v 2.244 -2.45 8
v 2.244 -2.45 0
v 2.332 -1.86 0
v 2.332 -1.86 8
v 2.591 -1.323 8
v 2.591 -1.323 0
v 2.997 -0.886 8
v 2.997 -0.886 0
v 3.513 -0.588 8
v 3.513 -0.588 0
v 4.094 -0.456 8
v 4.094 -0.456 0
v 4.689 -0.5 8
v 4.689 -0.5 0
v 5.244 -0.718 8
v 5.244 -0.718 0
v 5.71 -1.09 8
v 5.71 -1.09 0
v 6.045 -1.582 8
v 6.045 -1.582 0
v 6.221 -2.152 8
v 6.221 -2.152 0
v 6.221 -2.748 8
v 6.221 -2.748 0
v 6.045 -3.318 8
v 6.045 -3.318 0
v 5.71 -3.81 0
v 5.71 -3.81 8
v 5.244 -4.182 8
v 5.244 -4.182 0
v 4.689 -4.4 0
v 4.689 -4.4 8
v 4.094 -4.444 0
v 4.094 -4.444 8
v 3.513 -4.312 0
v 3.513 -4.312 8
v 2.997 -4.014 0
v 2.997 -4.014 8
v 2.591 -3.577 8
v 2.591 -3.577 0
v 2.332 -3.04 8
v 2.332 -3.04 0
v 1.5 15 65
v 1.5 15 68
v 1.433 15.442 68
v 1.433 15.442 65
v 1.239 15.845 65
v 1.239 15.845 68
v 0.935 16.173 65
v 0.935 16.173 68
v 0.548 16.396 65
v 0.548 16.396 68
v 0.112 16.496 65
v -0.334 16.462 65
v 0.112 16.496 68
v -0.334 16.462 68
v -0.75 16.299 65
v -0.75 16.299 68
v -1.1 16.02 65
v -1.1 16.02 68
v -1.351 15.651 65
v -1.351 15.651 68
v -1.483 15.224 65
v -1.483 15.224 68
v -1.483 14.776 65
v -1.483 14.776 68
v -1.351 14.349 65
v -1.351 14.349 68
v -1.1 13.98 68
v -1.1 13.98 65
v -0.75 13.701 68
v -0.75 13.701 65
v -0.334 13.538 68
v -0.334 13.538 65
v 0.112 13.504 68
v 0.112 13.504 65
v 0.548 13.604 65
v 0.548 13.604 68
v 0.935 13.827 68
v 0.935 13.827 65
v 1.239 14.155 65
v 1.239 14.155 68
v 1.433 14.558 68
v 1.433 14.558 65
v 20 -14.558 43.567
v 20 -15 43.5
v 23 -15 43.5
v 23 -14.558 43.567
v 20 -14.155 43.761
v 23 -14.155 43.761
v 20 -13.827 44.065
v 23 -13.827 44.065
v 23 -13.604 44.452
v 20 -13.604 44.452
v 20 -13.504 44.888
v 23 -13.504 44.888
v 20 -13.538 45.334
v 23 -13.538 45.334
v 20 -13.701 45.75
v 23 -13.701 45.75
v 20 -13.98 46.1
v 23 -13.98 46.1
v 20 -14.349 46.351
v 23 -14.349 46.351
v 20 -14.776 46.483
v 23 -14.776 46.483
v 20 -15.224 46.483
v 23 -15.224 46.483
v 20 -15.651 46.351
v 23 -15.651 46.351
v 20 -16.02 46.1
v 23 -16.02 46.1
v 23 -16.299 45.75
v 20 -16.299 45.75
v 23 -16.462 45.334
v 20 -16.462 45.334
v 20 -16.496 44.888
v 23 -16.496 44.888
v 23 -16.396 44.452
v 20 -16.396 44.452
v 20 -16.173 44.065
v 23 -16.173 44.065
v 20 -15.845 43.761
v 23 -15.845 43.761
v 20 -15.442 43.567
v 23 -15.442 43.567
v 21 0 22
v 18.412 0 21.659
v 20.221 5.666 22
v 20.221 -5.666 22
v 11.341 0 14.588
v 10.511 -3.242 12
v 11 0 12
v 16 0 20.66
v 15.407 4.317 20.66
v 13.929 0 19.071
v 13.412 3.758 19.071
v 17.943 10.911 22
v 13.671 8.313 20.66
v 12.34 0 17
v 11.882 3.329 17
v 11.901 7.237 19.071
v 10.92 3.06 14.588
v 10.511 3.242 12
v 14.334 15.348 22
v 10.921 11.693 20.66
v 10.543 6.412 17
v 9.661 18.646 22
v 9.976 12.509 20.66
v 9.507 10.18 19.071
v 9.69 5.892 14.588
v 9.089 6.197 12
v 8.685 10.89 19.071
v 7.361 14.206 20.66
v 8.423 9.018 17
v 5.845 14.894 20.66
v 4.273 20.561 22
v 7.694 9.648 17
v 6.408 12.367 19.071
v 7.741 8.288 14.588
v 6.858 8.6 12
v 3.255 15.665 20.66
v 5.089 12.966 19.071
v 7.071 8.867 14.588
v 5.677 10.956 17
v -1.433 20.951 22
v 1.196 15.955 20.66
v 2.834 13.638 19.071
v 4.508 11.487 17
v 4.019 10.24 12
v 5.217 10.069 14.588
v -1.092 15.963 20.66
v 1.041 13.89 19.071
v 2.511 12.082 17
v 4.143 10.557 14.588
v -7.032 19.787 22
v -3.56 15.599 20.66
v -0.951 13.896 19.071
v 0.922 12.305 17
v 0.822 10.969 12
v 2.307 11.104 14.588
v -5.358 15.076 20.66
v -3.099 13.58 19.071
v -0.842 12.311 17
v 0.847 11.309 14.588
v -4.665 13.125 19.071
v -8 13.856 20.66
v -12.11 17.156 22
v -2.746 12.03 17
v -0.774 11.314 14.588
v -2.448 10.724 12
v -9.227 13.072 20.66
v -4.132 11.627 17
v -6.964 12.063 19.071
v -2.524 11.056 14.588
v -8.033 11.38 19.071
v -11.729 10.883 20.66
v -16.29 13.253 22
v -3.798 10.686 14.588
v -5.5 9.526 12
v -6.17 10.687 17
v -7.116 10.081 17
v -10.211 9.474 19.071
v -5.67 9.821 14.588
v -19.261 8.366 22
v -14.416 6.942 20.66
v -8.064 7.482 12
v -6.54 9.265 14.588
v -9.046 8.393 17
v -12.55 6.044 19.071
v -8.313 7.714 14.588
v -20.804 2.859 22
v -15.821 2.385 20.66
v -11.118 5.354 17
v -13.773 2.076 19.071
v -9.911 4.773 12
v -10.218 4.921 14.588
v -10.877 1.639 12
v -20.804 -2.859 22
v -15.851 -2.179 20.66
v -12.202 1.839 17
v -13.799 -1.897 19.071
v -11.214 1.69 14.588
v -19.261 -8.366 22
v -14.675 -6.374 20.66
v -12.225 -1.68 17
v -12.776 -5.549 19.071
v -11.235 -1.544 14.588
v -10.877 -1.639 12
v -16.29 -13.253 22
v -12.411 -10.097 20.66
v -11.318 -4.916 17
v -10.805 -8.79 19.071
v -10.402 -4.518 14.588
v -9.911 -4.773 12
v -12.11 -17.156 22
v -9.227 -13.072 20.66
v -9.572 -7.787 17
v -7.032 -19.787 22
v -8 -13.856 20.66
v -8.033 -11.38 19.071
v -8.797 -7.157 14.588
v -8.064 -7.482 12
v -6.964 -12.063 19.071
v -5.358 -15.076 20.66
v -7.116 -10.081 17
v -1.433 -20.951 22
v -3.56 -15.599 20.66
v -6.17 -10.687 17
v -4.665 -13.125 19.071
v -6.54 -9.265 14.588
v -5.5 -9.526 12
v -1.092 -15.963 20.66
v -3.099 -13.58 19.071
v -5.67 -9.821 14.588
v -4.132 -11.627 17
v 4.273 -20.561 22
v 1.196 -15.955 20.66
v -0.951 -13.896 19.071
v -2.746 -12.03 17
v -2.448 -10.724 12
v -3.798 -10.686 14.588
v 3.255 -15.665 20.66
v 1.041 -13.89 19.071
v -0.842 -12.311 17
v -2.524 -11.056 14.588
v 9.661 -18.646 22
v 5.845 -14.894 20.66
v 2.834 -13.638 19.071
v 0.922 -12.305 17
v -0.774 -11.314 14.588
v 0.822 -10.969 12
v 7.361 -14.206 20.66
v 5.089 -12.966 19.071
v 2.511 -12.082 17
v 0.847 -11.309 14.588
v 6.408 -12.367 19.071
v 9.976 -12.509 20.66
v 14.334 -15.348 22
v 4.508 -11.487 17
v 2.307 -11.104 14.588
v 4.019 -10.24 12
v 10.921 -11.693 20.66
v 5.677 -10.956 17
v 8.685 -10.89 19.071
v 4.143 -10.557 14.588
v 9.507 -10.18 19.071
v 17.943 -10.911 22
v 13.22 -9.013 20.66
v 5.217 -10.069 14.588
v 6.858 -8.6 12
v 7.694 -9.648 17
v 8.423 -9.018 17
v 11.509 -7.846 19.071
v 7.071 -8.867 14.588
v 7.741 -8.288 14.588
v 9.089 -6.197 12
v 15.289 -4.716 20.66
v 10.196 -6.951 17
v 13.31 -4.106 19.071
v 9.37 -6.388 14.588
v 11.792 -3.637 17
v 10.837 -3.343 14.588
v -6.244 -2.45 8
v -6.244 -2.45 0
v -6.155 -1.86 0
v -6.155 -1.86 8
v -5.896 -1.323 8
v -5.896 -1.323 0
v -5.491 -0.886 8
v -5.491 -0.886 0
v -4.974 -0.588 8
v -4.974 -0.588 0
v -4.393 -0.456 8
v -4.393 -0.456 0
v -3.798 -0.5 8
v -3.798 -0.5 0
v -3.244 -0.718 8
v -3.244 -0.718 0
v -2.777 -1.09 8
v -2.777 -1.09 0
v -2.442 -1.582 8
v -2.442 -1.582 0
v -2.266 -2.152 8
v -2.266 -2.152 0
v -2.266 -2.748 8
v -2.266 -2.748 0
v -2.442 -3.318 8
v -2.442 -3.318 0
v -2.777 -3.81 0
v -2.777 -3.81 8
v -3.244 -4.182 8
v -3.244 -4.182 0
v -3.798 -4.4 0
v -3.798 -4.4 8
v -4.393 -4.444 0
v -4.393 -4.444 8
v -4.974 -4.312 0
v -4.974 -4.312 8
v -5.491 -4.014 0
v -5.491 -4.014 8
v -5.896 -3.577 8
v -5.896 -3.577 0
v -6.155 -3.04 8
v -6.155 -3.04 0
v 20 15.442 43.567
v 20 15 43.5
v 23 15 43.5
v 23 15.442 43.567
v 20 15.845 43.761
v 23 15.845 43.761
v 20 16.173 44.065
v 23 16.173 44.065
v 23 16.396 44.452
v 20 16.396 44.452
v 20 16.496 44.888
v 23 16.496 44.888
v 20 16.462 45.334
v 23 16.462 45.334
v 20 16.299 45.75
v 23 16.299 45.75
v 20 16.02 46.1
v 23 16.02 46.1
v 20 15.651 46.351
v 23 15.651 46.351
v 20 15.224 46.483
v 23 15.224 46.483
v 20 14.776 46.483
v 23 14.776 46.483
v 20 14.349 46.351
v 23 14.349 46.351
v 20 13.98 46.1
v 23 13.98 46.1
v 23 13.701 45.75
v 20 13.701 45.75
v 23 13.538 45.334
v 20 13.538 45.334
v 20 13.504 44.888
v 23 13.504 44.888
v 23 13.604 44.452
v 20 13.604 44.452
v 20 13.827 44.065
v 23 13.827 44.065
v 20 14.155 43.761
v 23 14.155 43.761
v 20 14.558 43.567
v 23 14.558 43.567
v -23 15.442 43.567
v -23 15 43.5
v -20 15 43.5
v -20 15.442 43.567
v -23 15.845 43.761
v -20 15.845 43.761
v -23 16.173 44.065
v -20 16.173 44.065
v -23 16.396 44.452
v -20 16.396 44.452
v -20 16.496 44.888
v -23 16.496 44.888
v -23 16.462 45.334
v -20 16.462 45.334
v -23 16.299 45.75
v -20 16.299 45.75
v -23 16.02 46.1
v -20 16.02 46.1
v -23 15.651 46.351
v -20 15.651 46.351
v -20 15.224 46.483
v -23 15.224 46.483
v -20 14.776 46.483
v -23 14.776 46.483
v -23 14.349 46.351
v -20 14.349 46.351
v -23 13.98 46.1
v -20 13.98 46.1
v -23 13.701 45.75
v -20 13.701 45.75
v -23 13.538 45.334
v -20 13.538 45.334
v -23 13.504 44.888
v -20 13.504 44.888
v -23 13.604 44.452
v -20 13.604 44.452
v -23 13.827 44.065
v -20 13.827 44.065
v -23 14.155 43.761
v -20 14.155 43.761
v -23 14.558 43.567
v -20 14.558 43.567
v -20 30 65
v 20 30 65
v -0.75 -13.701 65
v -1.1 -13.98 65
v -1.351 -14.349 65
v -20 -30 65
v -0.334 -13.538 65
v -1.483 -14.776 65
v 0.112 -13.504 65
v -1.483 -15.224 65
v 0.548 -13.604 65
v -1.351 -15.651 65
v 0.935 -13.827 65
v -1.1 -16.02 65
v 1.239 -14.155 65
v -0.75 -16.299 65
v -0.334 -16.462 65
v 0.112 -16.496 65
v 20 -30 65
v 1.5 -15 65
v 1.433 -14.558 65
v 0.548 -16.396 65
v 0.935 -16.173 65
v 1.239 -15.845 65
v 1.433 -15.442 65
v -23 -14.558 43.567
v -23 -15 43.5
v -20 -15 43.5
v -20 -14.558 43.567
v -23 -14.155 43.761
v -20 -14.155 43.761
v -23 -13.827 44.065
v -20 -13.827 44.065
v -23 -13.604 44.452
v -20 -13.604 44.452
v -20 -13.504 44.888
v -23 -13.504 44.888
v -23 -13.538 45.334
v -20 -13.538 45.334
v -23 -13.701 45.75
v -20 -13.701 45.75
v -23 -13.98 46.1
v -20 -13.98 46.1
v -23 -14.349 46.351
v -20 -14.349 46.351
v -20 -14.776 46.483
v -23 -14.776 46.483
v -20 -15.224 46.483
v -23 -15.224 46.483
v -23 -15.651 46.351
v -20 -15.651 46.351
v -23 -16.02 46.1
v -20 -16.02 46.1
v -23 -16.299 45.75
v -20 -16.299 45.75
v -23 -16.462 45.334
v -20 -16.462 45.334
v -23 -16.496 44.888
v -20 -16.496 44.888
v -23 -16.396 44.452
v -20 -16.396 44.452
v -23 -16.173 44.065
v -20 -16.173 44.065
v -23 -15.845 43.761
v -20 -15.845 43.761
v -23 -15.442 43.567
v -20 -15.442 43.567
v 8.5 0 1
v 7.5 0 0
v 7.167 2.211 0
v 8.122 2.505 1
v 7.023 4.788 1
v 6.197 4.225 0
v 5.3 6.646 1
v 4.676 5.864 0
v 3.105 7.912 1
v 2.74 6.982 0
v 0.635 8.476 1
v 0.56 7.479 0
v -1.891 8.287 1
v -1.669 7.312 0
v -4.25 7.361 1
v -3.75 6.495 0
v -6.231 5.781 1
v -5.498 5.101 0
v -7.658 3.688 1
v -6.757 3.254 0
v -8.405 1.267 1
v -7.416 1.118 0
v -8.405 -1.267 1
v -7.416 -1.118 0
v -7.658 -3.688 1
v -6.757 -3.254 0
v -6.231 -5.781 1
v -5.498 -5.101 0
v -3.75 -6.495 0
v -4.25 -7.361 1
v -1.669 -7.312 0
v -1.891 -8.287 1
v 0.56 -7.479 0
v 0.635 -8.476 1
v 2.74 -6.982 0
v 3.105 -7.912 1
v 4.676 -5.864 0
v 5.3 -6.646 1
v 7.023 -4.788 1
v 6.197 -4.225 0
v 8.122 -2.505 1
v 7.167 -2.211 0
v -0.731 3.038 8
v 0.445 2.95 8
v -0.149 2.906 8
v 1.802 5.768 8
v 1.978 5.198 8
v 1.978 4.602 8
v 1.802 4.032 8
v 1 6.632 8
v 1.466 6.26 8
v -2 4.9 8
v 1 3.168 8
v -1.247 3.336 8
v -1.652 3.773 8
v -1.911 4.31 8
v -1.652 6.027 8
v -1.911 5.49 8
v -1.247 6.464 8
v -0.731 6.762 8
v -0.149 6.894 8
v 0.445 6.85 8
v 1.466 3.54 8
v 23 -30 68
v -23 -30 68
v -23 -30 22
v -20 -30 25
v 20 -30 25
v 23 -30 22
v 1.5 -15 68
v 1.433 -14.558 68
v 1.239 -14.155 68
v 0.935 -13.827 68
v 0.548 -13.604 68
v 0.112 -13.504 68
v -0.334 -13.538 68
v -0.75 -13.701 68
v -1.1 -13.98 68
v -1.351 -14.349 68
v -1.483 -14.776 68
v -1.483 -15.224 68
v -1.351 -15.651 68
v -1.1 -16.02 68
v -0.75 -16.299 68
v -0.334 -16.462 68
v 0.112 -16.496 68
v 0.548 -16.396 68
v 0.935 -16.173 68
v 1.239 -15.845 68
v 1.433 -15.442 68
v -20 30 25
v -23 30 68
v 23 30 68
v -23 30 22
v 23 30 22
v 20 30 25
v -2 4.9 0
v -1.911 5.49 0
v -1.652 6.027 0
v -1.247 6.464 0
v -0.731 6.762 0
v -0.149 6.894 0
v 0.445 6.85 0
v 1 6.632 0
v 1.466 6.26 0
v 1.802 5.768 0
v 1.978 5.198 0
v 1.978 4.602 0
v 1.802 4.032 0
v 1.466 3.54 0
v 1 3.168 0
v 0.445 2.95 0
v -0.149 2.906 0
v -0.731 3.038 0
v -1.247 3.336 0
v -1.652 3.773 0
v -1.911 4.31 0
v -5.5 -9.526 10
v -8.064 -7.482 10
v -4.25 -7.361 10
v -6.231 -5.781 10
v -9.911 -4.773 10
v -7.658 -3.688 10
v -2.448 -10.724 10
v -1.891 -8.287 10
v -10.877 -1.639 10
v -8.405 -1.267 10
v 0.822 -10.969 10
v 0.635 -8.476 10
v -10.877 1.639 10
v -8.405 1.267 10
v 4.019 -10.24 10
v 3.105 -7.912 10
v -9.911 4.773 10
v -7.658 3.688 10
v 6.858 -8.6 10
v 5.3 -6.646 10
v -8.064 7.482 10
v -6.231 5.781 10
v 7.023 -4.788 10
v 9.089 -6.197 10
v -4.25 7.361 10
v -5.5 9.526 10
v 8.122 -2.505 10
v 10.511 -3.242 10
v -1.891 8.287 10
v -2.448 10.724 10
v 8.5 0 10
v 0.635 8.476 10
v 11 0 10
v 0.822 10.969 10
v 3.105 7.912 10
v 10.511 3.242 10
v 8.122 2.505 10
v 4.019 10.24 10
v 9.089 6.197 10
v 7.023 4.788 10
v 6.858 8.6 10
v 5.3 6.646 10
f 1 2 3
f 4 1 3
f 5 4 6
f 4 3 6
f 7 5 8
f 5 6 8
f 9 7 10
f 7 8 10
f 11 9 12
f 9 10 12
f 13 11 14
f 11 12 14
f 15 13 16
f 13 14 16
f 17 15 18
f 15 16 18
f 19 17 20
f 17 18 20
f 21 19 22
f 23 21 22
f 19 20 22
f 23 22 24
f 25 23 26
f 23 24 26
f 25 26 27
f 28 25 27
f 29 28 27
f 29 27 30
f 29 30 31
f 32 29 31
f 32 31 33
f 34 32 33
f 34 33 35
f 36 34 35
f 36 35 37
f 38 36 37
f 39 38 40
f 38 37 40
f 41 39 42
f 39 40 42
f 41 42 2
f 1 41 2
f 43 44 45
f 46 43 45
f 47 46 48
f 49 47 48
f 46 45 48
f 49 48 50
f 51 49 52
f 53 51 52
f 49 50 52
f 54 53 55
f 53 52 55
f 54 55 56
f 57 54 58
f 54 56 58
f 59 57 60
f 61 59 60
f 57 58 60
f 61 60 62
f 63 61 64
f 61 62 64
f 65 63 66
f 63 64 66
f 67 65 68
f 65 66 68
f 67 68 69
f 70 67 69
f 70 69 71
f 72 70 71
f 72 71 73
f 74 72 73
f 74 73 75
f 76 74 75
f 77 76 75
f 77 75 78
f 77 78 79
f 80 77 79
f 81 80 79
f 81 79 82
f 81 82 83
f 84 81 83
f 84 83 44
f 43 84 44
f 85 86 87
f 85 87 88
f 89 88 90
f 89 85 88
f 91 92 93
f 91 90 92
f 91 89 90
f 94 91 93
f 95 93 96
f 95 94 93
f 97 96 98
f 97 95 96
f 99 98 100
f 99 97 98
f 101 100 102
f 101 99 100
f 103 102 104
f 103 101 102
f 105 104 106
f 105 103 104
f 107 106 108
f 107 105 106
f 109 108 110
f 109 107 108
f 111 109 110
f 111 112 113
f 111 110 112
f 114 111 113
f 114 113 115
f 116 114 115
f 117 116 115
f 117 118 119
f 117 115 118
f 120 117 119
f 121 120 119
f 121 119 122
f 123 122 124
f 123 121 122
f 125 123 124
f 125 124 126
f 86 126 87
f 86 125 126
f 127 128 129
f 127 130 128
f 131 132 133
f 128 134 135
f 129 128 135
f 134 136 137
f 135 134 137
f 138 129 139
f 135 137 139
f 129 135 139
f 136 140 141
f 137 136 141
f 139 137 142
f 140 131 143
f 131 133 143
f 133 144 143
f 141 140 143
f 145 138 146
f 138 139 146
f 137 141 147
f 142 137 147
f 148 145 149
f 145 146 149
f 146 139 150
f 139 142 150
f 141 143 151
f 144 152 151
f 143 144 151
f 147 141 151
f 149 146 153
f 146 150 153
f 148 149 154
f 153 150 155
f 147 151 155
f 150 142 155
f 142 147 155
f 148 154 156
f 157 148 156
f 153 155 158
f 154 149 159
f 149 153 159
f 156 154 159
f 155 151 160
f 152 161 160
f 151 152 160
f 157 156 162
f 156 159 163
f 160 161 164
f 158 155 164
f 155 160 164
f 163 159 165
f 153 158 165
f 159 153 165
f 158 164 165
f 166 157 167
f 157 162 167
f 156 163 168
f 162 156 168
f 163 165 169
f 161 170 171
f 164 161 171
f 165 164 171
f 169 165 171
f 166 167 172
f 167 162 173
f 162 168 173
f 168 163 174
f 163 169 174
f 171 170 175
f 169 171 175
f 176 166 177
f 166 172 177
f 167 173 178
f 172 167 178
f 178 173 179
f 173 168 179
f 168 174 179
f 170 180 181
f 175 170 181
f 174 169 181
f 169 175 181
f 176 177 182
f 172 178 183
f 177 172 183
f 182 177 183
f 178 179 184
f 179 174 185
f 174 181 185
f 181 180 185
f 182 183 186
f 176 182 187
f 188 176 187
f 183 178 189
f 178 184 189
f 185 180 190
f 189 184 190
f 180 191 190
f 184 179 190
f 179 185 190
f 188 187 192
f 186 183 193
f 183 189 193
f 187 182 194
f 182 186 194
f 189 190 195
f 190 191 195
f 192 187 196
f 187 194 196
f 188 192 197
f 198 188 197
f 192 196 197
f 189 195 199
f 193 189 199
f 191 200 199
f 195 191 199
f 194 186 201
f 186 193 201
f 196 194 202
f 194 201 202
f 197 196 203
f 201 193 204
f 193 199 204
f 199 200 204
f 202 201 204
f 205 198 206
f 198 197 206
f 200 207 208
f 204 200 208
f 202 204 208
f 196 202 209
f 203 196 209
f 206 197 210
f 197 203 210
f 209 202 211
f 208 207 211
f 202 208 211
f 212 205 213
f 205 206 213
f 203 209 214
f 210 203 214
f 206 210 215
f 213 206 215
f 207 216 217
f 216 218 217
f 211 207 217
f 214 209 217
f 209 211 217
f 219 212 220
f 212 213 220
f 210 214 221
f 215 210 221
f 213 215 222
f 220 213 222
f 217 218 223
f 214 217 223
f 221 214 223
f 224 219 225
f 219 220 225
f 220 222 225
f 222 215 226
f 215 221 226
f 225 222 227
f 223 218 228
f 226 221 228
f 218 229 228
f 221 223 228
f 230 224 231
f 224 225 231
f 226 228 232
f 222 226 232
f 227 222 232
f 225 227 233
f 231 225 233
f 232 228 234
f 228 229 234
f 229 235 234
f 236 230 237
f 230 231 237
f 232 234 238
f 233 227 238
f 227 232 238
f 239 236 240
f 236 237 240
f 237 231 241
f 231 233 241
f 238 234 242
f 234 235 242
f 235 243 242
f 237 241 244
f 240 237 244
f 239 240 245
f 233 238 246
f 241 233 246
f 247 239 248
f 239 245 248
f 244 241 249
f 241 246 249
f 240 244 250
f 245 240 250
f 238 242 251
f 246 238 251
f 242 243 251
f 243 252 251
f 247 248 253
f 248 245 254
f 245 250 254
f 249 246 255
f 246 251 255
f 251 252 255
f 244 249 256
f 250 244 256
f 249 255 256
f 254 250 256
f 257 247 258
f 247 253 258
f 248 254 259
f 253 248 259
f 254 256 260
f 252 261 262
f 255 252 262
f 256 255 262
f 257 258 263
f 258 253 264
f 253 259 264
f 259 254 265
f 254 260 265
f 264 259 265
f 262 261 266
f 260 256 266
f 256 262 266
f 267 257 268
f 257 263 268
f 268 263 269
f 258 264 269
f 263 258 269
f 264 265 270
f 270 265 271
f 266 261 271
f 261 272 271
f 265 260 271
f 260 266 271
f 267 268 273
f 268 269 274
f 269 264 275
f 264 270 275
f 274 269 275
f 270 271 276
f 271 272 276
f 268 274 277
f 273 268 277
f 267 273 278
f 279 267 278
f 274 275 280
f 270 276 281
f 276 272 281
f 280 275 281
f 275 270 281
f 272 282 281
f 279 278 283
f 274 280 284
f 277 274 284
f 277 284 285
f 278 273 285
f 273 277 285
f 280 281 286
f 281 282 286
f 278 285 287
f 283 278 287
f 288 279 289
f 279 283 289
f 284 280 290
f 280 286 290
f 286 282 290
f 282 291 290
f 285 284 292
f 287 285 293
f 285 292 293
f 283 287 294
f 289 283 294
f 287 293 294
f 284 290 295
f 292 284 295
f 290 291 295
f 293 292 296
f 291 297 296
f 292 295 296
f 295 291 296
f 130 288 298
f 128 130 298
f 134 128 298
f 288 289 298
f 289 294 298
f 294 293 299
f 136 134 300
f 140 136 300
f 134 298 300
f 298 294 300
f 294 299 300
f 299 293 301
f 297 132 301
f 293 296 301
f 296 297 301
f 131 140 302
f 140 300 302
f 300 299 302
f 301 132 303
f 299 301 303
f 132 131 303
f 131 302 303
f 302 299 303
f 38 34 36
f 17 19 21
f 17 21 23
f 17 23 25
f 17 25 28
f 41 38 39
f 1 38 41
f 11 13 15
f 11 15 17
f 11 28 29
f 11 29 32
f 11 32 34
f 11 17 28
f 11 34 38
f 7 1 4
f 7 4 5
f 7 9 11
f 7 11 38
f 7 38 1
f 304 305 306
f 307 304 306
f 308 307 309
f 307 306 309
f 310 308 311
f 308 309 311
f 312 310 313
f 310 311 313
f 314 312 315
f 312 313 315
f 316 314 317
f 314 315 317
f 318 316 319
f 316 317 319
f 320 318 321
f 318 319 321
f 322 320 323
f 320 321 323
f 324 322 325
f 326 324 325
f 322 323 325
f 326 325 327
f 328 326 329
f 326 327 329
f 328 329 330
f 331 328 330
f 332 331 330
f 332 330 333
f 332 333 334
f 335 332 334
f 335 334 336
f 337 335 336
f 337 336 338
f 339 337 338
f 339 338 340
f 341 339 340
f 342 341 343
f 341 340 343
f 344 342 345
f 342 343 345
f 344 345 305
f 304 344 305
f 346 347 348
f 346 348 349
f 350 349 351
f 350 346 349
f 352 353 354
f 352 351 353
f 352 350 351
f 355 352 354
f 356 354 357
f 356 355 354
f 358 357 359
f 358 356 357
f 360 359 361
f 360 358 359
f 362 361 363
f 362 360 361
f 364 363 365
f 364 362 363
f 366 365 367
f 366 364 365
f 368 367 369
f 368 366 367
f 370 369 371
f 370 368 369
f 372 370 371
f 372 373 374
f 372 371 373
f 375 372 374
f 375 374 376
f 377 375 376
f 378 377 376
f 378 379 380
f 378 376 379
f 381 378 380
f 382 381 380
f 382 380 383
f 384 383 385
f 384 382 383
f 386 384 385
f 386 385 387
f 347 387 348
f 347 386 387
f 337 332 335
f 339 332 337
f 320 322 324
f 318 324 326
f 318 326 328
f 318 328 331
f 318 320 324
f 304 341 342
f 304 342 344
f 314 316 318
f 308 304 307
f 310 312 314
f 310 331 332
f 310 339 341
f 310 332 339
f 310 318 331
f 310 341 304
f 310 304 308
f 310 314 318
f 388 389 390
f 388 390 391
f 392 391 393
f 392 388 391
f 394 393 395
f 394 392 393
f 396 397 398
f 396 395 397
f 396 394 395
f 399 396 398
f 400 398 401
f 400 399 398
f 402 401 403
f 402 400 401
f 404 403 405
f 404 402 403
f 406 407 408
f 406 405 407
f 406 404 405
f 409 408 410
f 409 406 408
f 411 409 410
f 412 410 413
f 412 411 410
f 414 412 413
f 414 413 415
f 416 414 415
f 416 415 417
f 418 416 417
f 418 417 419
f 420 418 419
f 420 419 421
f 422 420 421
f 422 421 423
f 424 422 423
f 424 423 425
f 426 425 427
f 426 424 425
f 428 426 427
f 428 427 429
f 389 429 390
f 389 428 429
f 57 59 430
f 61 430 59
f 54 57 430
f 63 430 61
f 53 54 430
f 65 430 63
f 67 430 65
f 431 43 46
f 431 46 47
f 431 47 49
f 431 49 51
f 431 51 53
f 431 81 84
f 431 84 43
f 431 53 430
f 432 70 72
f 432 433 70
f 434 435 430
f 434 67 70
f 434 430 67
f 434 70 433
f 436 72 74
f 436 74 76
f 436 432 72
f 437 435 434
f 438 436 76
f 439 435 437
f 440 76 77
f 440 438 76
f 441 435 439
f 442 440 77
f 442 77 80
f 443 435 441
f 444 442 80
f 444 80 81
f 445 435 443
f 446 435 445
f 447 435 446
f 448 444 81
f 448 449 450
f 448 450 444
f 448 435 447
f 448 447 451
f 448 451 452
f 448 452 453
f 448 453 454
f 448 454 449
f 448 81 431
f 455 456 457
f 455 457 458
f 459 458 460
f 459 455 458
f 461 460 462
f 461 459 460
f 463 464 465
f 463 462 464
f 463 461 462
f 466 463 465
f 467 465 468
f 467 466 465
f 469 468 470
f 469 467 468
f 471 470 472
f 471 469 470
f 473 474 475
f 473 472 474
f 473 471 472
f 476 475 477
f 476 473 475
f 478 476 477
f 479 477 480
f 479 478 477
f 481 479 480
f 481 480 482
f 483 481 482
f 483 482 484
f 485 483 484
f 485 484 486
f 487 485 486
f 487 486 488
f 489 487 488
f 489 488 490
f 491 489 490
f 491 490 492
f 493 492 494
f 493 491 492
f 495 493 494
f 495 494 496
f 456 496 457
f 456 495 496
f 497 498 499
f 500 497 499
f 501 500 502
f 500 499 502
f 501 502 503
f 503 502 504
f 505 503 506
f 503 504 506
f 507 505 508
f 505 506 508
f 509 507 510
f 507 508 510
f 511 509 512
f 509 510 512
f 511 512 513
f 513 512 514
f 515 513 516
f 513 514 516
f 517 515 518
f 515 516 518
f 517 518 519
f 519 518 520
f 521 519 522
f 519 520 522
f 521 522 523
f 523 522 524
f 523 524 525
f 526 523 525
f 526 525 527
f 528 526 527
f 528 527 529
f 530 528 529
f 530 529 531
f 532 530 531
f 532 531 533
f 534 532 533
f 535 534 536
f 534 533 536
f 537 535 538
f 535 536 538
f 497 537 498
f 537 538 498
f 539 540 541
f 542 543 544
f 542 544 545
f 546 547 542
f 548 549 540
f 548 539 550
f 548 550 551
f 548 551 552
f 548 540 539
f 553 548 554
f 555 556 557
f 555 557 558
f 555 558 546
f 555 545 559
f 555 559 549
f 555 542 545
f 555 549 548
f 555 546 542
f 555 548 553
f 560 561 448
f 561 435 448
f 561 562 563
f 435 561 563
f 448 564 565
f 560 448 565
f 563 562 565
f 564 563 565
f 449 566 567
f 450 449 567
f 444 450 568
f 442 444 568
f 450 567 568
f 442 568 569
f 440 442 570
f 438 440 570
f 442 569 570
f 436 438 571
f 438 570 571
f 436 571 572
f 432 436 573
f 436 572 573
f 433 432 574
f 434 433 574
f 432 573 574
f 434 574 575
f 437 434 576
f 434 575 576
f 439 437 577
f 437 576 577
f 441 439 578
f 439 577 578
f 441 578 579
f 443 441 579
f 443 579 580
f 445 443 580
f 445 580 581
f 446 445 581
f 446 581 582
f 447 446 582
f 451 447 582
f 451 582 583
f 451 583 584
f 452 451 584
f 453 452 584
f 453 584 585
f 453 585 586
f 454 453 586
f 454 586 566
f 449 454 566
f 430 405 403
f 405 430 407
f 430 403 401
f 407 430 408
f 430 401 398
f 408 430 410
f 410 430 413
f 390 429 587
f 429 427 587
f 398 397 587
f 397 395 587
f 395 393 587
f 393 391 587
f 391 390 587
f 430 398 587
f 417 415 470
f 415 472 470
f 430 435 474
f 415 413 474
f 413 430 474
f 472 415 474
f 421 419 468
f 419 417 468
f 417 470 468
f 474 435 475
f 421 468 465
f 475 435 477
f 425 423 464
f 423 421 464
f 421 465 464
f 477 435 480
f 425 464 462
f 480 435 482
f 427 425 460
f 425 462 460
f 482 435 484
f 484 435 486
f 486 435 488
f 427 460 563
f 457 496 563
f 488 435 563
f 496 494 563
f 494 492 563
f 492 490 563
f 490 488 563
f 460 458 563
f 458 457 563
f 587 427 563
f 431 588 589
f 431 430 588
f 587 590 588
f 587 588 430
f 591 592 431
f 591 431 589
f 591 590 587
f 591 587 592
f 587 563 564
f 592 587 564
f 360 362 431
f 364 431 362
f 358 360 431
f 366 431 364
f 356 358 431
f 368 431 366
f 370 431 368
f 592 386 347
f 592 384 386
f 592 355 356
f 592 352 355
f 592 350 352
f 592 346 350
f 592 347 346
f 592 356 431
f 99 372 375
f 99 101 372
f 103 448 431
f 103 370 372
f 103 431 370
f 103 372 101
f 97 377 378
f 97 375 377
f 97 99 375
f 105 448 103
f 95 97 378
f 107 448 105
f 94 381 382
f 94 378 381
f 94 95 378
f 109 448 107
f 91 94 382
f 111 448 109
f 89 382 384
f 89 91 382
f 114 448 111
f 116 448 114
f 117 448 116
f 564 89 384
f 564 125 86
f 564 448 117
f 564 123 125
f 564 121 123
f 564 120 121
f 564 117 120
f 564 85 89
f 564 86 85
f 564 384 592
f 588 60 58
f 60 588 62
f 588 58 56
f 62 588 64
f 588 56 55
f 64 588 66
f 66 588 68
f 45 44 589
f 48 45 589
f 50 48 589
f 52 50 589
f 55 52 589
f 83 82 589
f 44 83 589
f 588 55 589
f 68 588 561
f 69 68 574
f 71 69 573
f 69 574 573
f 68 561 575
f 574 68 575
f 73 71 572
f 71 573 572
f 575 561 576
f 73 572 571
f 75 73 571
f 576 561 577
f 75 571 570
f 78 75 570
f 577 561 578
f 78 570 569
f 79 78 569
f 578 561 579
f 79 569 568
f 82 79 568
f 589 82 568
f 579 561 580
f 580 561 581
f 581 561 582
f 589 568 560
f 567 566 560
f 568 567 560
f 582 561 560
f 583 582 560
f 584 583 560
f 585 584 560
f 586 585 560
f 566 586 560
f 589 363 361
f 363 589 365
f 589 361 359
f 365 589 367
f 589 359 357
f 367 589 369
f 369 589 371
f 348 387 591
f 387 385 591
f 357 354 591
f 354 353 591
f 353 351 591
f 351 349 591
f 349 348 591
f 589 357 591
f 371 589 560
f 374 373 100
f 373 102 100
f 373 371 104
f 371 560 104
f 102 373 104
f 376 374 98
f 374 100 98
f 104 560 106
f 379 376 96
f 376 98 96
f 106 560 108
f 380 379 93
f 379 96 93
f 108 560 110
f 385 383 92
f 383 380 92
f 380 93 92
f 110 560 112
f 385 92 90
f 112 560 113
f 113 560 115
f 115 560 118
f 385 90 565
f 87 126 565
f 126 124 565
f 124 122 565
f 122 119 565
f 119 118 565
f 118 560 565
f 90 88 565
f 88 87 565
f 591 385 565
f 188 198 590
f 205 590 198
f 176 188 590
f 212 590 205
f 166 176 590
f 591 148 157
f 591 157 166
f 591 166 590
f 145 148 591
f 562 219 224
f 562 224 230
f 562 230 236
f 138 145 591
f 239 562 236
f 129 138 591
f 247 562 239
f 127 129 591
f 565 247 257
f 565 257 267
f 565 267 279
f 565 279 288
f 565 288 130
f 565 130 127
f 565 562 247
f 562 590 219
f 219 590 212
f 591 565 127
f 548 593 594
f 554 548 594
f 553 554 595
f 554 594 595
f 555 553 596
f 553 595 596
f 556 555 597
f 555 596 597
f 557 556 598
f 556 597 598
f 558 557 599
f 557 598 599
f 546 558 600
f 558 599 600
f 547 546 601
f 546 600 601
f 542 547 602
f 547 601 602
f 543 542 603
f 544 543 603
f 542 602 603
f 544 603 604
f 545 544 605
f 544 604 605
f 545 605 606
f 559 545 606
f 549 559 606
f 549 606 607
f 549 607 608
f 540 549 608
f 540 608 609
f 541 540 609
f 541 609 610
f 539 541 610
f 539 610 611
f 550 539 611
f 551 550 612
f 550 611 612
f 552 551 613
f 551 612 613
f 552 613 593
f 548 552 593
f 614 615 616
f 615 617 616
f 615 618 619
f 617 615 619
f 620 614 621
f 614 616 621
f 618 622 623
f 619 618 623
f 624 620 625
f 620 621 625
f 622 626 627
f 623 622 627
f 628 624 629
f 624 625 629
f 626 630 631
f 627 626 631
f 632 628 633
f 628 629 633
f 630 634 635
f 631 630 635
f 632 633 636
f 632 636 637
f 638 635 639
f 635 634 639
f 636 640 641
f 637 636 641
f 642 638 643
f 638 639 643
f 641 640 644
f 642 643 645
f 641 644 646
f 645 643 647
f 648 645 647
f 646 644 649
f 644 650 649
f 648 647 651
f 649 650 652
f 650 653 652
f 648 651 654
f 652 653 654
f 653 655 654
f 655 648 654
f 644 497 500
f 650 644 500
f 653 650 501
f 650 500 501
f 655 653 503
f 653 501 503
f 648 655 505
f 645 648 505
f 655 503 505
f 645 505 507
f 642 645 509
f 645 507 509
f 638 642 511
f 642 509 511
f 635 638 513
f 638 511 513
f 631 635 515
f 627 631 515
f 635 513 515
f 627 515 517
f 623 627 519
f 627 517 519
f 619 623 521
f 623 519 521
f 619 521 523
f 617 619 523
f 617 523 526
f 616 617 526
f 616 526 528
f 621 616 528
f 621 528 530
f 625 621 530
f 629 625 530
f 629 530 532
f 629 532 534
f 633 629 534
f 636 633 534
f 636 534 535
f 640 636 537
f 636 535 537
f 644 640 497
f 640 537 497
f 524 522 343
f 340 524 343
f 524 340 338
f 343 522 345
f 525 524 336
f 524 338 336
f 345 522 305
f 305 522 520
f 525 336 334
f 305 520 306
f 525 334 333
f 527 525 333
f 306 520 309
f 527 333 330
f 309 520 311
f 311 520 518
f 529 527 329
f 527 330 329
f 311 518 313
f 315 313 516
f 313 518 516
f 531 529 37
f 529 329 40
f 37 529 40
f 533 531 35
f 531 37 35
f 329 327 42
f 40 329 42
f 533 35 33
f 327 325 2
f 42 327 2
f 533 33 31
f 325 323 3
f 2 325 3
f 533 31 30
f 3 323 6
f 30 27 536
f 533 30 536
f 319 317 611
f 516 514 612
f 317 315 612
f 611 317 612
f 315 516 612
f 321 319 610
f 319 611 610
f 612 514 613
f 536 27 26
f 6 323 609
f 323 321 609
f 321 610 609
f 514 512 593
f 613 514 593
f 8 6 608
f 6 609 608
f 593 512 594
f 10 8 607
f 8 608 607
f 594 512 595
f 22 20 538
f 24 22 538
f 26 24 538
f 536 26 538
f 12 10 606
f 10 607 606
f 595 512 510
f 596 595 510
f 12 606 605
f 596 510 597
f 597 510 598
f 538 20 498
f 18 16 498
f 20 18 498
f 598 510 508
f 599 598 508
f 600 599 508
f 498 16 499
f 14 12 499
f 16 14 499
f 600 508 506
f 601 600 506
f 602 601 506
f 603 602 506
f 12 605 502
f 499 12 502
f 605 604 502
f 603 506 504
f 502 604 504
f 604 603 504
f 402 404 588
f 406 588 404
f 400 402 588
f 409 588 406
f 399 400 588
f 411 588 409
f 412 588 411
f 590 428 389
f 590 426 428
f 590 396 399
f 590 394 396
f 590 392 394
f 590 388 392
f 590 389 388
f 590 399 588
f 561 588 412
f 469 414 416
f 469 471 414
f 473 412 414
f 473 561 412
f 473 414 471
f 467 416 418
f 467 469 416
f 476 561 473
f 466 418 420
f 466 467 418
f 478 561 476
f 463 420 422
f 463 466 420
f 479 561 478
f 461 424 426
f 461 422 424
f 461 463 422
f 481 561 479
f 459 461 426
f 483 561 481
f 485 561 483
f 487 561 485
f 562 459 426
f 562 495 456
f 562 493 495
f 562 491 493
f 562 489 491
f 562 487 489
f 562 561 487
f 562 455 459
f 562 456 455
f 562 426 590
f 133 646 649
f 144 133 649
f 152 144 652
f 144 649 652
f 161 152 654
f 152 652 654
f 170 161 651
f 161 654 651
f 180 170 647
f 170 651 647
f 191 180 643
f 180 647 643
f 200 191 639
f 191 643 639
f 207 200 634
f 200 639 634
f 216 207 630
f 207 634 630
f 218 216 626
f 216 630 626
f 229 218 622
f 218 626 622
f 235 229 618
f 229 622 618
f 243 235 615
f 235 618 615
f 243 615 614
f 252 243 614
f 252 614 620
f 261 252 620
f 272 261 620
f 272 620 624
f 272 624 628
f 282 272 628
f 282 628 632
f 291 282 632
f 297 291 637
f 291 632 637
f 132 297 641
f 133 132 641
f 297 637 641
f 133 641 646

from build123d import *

# Parameters (mm, degrees)
ESQUISSE1_R                  = 8.5
BOSS_EXTRU_1_DEPTH           = 10
ESQUISSE2_R                  = 11
BOSS_EXTRU_2_DEPTH           = 12
ESQUISSE3_R                  = 2
ENL_V_MAT_EXTRU_1_DEPTH      = 8
CHANFREIN1_SIZE              = 1
BOSS_EXTRU_3_DEPTH           = 30
BOSS_EXTRU_3_DEPTH_BACK      = 30
ESQUISSE4_W                  = 46
ESQUISSE4_H                  = 46
ESQUISSE4_W_2                = 40
ESQUISSE4_H_2                = 40
ENL_V_MAT_EXTRU_2_DEPTH      = 88.407093534
ENL_V_MAT_EXTRU_2_DEPTH_BACK = 88.407093534
ESQUISSE5_R                  = 1.5
ESQUISSE6_R                  = 1.5
ENL_V_MAT_EXTRU_3_DEPTH      = 10
CONG_1_R                     = 10


with BuildPart() as part:
    # Esquisse1 → Boss.-Extru.1 (new body)
    with BuildSketch(Plane.XY):
        Circle(ESQUISSE1_R)
    extrude(amount=BOSS_EXTRU_1_DEPTH)

    # Esquisse2 → Boss.-Extru.2 (add)
    with BuildSketch(Plane.XY.offset(10)):
        Circle(ESQUISSE2_R)
    extrude(amount=BOSS_EXTRU_2_DEPTH)

    # Esquisse3 → Enlèv. mat.-Extru.1 (cut)
    with BuildSketch(Plane(origin=(0, 0, 0), x_dir=(-1, 0, 0), z_dir=(0, 0, -1))):
        with Locations((0, 4.9)):
            Circle(ESQUISSE3_R)
        with Locations((4.243524479, -2.45)):
            Circle(ESQUISSE3_R)
        with Locations((-4.243524479, -2.45)):
            Circle(ESQUISSE3_R)
    extrude(amount=-ENL_V_MAT_EXTRU_1_DEPTH, mode=Mode.SUBTRACT)

    # Chanfrein1
    chanfrein1_edges = [part.edges().sort_by_distance(p)[0] for p in [
        (-8.5, 0, 0),
    ]]
    chamfer(chanfrein1_edges, length=CHANFREIN1_SIZE)

    # Esquisse4 → Boss.-Extru.3 (add, two sides: drawn at the far end of the back side and taken through both)
    with BuildSketch(Plane(origin=(0, 0, 0), x_dir=(1, 0, 0), z_dir=(0, 1, 0)).offset(-BOSS_EXTRU_3_DEPTH_BACK)):
        with Locations((0, -45)):
            Rectangle(ESQUISSE4_W, ESQUISSE4_H)
        with Locations((0, -45)):
            Rectangle(ESQUISSE4_W_2, ESQUISSE4_H_2, mode=Mode.SUBTRACT)
    extrude(amount=BOSS_EXTRU_3_DEPTH + BOSS_EXTRU_3_DEPTH_BACK)

    # Esquisse5 → Enlèv. mat.-Extru.2 (cut, two sides: drawn at the far end of the back side and taken through both)
    with BuildSketch(Plane(origin=(23, 0, 0), x_dir=(0, 0, -1), z_dir=(1, 0, 0)).offset(-ENL_V_MAT_EXTRU_2_DEPTH_BACK)):
        with Locations((-45, 15)):
            Circle(ESQUISSE5_R)
        with Locations((-45, -15)):
            Circle(ESQUISSE5_R)
    extrude(amount=ENL_V_MAT_EXTRU_2_DEPTH + ENL_V_MAT_EXTRU_2_DEPTH_BACK, mode=Mode.SUBTRACT)

    # Esquisse6 → Enlèv. mat.-Extru.3 (cut)
    with BuildSketch(Plane.XY.offset(68)):
        with Locations((0, 15)):
            Circle(ESQUISSE6_R)
        with Locations((0, -15)):
            Circle(ESQUISSE6_R)
    extrude(amount=-ENL_V_MAT_EXTRU_3_DEPTH, mode=Mode.SUBTRACT)

    # Congé1
    cong_1_edges = [part.edges().sort_by_distance(p)[0] for p in [
        (-11, 0, 22),
    ]]
    fillet(cong_1_edges, radius=CONG_1_R)


solid = part.part
